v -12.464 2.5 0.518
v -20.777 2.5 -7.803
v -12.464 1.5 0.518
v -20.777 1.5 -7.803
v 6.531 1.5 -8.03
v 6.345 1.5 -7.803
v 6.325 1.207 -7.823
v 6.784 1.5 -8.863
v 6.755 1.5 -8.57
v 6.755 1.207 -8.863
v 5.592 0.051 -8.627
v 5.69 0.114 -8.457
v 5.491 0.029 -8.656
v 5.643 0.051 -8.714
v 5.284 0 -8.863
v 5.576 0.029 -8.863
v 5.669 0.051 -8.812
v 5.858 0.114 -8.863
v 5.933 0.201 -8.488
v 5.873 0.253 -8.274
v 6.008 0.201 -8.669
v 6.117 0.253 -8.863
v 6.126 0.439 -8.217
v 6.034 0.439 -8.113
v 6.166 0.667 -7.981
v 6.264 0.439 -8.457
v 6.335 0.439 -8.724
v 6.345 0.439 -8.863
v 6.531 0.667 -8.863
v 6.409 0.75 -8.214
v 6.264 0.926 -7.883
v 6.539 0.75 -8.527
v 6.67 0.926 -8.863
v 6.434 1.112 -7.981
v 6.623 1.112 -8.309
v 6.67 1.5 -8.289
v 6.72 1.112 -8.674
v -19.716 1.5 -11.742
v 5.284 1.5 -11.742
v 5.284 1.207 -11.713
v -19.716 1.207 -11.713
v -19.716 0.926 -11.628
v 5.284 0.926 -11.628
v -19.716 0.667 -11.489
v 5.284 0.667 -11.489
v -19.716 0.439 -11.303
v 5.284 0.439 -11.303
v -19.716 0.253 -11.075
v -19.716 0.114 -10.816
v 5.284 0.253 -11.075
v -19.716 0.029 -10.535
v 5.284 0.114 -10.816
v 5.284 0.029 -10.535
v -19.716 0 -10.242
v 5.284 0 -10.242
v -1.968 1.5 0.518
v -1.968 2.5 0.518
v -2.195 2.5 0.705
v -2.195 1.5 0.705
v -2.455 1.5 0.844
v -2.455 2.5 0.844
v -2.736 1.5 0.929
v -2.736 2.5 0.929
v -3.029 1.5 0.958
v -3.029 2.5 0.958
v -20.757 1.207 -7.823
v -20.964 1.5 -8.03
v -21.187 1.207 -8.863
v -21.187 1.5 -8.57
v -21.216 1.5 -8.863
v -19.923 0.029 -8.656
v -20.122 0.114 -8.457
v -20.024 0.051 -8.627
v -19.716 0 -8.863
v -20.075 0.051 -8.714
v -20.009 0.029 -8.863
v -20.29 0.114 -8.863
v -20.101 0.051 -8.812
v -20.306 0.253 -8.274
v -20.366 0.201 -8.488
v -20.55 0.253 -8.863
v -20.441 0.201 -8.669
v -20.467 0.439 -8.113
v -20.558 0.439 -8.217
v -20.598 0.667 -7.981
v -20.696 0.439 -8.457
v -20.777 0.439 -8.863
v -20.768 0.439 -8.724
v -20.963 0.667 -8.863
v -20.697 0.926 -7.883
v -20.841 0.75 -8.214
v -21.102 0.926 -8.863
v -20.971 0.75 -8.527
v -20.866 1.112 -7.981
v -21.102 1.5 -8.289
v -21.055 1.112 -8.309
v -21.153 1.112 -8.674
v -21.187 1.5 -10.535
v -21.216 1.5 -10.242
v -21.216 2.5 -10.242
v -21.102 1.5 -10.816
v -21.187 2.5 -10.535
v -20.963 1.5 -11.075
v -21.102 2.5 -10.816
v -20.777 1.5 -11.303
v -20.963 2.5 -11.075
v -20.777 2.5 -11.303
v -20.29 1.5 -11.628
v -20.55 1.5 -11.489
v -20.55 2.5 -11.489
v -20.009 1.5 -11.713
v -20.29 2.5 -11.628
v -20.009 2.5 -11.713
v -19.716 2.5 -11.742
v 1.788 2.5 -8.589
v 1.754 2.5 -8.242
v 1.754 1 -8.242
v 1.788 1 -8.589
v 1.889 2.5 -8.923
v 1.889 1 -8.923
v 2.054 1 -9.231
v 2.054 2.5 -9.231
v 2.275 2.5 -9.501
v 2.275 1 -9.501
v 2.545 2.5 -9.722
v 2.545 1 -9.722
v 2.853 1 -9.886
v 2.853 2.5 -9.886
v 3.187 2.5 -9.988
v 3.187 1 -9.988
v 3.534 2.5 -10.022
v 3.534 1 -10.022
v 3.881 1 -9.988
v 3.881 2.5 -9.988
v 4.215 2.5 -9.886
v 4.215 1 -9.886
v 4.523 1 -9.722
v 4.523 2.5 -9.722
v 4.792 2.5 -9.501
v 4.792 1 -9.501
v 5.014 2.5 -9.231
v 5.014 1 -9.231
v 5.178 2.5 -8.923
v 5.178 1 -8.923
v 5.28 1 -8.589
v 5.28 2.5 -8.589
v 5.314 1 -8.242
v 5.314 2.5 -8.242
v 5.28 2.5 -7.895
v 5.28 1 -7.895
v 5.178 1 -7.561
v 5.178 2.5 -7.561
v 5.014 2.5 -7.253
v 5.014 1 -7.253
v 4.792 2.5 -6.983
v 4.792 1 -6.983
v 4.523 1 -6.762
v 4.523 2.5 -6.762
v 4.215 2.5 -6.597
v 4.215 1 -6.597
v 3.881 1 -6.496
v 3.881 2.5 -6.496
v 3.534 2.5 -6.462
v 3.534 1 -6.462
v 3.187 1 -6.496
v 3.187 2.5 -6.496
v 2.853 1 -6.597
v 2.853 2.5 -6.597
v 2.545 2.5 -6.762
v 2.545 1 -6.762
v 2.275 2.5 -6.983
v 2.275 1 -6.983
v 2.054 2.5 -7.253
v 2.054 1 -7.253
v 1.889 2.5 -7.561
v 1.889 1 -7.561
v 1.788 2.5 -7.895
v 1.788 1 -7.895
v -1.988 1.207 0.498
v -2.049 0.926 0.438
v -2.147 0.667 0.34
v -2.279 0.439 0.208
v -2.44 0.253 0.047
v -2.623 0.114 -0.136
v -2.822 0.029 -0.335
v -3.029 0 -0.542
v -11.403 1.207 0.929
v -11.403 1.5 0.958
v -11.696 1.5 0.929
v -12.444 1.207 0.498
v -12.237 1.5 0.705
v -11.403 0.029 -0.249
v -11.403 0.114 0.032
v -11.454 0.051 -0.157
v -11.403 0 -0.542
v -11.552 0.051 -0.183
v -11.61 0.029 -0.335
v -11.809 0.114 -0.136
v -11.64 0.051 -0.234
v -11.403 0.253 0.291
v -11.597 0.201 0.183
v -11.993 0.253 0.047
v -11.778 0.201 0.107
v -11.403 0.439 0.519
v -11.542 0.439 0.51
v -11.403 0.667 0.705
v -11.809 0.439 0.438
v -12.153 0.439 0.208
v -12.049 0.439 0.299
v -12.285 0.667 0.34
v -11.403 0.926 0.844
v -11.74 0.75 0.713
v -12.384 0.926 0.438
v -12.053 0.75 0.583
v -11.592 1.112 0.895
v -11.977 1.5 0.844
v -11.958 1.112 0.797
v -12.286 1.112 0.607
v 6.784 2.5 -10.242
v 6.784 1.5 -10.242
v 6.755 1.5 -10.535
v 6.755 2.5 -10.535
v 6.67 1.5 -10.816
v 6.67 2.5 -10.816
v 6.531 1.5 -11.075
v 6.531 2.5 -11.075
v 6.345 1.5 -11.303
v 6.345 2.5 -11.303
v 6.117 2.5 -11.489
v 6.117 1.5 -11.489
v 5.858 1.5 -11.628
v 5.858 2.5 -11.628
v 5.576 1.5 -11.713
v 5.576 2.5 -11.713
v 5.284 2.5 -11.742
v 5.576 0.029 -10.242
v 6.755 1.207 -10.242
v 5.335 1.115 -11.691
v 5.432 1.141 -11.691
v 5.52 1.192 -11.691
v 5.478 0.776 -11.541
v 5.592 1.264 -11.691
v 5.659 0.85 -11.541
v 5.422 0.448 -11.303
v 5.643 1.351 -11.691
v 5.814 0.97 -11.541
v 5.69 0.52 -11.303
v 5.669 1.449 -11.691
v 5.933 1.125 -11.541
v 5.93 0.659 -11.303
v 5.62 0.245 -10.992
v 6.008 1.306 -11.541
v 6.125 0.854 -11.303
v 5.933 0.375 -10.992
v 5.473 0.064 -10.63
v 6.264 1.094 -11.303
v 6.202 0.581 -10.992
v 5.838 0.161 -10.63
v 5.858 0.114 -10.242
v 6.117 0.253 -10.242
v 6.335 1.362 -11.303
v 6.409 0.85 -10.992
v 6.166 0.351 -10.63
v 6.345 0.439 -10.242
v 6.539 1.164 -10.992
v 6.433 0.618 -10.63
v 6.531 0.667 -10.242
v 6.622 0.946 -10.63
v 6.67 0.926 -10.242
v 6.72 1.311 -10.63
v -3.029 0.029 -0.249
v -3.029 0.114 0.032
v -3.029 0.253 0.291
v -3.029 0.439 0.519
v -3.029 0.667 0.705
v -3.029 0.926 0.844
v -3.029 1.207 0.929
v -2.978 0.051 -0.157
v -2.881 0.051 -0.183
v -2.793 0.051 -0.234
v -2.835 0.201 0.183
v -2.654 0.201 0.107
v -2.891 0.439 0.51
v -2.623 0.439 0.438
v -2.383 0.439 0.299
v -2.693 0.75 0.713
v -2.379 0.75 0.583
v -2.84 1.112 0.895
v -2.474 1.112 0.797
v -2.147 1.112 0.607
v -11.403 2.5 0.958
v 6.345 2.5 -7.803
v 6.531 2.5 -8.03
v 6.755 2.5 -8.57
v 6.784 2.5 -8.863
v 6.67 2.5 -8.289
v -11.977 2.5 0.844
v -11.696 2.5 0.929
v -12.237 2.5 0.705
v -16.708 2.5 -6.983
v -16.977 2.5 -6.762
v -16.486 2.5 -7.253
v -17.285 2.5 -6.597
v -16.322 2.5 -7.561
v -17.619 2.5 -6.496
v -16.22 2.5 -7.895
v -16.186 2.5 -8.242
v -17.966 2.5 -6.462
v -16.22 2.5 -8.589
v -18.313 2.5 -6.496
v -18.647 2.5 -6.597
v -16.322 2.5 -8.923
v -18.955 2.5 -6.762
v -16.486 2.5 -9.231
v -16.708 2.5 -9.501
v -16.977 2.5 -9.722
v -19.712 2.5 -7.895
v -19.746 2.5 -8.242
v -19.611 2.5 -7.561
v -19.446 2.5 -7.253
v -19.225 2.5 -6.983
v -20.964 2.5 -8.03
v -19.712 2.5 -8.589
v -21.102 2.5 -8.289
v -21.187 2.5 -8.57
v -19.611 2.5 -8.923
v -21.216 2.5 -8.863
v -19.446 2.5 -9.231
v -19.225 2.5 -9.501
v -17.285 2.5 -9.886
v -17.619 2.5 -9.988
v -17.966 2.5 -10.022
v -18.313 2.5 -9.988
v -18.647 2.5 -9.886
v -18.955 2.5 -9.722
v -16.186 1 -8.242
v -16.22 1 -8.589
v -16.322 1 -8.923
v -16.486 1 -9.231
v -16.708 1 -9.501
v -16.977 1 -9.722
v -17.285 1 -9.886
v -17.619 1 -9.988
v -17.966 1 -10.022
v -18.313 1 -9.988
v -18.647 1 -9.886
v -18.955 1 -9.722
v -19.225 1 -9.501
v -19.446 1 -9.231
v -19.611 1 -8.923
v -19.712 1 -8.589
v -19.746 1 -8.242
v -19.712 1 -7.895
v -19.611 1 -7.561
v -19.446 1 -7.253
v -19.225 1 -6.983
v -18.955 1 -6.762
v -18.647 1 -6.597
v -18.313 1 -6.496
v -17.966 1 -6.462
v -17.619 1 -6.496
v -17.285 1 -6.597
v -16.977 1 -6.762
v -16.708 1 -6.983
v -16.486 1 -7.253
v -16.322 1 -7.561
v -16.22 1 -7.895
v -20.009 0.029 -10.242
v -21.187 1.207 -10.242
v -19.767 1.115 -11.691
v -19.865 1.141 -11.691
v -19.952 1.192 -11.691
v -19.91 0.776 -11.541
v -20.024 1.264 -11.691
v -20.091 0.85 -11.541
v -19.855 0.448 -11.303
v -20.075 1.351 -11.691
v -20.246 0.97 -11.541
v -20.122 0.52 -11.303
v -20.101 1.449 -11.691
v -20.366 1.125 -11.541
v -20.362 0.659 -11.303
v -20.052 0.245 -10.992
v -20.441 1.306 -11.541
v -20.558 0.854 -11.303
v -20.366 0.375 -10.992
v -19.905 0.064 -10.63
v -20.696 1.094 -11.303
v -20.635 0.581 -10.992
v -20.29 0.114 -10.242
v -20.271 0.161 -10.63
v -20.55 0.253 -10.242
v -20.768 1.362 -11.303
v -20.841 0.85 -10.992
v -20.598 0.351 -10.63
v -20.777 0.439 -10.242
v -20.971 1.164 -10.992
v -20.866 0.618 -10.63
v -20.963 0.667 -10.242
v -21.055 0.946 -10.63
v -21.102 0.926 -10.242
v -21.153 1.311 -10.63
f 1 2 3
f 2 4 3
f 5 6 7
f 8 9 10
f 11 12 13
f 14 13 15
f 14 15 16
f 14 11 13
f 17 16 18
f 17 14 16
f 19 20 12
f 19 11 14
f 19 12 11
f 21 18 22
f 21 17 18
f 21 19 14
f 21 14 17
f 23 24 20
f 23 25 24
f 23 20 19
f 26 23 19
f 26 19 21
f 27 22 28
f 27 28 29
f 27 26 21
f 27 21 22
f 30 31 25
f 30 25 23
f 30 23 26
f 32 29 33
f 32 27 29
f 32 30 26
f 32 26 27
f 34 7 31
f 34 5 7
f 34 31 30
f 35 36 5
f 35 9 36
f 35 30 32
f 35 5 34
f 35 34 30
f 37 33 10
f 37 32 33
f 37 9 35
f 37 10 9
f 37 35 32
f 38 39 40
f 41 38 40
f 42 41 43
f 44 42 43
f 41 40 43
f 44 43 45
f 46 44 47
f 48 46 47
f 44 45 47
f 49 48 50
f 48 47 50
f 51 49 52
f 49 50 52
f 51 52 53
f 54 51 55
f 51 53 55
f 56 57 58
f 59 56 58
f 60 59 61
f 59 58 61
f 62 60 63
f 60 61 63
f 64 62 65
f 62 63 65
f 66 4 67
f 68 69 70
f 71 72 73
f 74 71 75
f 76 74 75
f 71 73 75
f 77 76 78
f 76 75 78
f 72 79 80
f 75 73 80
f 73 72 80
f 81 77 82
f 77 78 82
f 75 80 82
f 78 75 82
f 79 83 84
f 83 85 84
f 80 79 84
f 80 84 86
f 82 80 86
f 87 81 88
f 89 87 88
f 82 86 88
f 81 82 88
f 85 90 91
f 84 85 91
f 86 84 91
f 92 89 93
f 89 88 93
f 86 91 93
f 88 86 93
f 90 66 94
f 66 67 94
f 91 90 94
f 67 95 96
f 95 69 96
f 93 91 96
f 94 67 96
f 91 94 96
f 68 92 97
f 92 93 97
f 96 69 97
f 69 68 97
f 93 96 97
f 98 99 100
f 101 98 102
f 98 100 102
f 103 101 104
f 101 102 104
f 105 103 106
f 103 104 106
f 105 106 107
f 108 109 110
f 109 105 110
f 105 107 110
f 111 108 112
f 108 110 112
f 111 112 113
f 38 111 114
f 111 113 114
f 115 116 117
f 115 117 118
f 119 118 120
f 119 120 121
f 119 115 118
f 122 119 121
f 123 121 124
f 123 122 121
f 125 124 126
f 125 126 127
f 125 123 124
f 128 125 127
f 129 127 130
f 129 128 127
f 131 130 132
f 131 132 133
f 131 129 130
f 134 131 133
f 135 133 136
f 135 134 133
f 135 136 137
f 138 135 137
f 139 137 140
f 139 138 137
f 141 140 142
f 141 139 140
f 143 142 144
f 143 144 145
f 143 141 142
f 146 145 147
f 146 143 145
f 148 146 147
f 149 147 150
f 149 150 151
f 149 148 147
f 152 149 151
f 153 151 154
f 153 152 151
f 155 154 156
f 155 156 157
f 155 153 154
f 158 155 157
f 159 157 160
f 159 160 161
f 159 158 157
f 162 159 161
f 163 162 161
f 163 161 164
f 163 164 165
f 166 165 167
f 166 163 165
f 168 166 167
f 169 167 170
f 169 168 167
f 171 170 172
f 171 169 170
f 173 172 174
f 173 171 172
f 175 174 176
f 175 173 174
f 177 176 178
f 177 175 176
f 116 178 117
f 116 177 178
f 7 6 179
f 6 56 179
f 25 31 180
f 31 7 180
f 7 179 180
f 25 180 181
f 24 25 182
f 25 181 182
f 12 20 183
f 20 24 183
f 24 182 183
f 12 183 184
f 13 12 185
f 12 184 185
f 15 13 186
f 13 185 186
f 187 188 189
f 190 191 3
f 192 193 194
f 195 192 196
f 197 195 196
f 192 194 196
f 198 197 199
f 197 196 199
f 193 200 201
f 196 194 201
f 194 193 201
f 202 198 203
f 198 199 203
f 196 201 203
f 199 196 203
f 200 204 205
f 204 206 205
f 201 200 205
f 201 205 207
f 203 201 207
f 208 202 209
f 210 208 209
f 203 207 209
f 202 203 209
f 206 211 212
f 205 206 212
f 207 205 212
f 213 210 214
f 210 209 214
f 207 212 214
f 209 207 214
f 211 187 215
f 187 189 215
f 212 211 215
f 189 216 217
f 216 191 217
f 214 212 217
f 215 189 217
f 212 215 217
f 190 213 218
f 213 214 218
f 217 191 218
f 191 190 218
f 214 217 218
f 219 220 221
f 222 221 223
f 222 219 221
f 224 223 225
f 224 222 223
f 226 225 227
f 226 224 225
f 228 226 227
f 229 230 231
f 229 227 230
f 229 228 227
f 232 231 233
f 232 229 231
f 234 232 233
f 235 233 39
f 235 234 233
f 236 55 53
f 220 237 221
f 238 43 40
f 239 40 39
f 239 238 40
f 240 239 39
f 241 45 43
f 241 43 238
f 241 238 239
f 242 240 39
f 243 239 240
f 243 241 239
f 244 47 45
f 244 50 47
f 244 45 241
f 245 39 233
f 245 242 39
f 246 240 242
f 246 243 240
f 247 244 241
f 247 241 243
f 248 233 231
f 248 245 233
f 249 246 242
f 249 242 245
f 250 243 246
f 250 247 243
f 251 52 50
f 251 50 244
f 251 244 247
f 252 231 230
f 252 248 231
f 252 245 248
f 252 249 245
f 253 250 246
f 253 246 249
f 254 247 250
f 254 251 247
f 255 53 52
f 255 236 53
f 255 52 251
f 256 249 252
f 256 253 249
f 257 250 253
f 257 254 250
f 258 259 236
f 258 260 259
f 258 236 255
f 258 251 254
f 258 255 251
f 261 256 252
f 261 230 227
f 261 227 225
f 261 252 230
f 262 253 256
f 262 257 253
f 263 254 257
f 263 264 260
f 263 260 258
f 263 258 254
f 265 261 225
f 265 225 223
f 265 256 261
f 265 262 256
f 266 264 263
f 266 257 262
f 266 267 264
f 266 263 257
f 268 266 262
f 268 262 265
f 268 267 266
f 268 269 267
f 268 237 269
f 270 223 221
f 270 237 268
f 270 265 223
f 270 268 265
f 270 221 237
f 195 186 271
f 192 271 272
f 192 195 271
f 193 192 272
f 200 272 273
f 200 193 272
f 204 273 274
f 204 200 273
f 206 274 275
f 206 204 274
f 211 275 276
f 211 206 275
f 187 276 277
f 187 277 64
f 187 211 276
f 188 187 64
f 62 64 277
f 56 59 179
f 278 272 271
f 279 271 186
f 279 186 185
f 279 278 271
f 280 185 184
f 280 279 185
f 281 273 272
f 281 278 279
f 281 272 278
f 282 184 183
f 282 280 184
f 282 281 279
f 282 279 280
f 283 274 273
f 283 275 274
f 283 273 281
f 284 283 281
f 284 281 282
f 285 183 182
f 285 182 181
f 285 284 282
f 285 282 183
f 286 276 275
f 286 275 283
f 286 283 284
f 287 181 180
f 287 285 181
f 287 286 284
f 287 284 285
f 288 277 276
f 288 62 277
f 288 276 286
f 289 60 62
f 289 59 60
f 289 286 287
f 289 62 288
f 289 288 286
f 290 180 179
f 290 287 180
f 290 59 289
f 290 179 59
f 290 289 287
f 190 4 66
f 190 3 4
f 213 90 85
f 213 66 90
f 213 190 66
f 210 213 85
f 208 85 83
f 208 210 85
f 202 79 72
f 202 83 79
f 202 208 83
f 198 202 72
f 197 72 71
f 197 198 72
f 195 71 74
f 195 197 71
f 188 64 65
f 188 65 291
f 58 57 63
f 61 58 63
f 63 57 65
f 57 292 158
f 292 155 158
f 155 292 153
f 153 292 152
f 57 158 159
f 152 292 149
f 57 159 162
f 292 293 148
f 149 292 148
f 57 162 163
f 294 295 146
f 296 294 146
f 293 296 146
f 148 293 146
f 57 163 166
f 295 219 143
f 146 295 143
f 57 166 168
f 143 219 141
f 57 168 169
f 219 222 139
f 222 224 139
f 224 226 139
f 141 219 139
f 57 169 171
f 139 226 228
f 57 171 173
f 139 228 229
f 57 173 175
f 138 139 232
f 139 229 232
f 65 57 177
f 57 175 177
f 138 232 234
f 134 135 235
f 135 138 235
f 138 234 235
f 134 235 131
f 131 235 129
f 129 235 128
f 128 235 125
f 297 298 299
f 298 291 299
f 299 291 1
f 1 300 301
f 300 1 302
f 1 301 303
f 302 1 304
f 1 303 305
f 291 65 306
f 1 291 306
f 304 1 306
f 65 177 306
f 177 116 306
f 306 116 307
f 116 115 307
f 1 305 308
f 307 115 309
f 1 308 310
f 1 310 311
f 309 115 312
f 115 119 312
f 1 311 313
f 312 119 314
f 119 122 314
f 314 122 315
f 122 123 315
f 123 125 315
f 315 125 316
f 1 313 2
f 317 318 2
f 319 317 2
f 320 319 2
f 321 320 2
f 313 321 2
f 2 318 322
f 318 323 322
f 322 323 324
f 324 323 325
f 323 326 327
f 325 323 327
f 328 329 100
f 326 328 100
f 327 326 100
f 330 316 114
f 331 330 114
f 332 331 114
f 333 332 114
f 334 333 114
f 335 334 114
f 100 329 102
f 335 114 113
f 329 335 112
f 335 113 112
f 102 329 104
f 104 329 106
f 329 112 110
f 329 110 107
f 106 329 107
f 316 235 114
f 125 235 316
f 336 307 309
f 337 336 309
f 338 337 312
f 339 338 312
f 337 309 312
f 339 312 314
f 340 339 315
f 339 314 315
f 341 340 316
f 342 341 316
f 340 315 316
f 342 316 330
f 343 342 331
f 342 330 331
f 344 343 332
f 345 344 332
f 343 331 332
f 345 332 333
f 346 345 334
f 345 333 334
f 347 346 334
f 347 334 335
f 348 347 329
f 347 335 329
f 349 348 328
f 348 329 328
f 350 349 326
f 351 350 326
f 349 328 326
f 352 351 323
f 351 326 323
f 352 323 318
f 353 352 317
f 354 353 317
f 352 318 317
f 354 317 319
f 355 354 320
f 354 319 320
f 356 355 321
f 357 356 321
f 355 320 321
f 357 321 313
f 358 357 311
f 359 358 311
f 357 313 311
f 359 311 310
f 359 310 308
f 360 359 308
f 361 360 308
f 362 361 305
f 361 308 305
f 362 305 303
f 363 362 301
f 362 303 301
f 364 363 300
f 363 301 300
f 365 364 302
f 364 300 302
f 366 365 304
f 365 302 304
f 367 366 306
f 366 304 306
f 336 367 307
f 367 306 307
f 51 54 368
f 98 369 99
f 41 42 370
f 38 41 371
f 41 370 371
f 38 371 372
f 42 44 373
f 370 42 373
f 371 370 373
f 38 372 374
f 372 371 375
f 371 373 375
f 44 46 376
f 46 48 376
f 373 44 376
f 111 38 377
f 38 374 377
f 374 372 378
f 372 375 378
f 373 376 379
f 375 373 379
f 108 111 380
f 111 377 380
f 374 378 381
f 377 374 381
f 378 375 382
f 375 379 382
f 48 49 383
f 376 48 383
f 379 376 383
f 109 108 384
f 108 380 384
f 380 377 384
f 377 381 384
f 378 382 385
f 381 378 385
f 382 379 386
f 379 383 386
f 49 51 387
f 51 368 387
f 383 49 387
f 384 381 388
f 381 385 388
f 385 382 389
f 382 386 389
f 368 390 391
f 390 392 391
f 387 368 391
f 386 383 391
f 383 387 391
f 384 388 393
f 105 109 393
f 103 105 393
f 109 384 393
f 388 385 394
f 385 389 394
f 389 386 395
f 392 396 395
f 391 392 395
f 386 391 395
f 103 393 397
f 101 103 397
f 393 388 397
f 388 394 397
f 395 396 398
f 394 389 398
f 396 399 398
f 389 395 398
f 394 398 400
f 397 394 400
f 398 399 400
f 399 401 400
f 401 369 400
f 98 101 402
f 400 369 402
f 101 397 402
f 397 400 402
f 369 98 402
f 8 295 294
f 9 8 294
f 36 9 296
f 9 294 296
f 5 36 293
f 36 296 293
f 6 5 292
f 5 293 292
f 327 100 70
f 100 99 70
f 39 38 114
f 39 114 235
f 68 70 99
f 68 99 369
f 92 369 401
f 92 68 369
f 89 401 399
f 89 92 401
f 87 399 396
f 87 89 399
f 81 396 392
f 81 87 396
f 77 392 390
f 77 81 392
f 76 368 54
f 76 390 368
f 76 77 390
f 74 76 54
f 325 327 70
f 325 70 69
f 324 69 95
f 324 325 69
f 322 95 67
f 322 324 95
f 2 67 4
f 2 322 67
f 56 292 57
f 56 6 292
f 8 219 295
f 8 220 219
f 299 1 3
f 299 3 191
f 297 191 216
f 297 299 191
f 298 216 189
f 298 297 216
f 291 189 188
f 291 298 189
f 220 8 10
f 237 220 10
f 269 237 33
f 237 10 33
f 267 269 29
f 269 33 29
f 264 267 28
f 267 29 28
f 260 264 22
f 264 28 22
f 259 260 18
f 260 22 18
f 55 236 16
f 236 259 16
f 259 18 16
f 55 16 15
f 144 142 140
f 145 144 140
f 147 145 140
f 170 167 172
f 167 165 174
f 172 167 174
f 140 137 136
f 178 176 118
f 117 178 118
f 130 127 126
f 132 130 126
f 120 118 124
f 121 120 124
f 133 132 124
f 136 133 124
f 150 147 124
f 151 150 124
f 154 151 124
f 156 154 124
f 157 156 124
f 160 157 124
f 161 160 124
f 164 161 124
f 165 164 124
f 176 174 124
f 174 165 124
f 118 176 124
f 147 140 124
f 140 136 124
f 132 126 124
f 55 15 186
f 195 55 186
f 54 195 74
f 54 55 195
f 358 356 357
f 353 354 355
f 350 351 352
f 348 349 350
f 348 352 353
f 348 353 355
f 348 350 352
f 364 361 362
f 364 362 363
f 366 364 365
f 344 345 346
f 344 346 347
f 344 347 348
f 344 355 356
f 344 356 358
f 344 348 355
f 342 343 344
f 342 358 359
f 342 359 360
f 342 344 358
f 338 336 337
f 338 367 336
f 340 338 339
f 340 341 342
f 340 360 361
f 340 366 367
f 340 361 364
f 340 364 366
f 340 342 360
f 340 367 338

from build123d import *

# Parameters (mm, degrees)
BOSS_EXTRUDE1_DEPTH = 2.5
SKETCH2_R           = 1.78
CUT_EXTRUDE1_DEPTH  = 1.5
FILLET1_R           = 1.5


with BuildPart() as part:
    # Sketch1 → Boss-Extrude1 (new body)
    with BuildSketch(Plane(origin=(0, 0, 0), x_dir=(1, 0, 0), z_dir=(0, 1, 0))):
        Polygon((-21.216153836, 11.741903429), (-21.216153836, 8.241903429), (-12.024866066, -0.958096571), (-7.216153836, -0.958096571), (-7.216153836, 11.741903429), align=None)
    extrude(amount=BOSS_EXTRUDE1_DEPTH)

    # Sketch2 → Cut-Extrude1 (cut)
    with BuildSketch(Plane(origin=(0, 2.5, 0), x_dir=(1, 0, 0), z_dir=(0, 1, 0))):
        with Locations((-17.966153836, 8.241903429)):
            Circle(SKETCH2_R)
    extrude(amount=-CUT_EXTRUDE1_DEPTH, mode=Mode.SUBTRACT)

    # Fillet1
    fillet1_edges = [part.edges().sort_by_distance(p)[0] for p in [
        (-9.620509951, 0, 0.958096571),
        (-16.620509951, 0, -3.641903429),
        (-21.216153836, 0, -9.991903429),
        (-14.216153836, 0, -11.741903429),
        (-12.024866066, 1.25, 0.958096571),
        (-21.216153836, 1.25, -8.241903429),
        (-21.216153836, 1.25, -11.741903429),
    ]]
    fillet(fillet1_edges, radius=FILLET1_R)

    # Mirror1: part across plane


with BuildPart() as part_1:
    add(part.part)
    add(part.part.mirror(Plane(origin=(-7.216153836, 2.5, 0.958096571), x_dir=(0, 0, 1), z_dir=(-1, 0, 0))))


solid = part_1.part
